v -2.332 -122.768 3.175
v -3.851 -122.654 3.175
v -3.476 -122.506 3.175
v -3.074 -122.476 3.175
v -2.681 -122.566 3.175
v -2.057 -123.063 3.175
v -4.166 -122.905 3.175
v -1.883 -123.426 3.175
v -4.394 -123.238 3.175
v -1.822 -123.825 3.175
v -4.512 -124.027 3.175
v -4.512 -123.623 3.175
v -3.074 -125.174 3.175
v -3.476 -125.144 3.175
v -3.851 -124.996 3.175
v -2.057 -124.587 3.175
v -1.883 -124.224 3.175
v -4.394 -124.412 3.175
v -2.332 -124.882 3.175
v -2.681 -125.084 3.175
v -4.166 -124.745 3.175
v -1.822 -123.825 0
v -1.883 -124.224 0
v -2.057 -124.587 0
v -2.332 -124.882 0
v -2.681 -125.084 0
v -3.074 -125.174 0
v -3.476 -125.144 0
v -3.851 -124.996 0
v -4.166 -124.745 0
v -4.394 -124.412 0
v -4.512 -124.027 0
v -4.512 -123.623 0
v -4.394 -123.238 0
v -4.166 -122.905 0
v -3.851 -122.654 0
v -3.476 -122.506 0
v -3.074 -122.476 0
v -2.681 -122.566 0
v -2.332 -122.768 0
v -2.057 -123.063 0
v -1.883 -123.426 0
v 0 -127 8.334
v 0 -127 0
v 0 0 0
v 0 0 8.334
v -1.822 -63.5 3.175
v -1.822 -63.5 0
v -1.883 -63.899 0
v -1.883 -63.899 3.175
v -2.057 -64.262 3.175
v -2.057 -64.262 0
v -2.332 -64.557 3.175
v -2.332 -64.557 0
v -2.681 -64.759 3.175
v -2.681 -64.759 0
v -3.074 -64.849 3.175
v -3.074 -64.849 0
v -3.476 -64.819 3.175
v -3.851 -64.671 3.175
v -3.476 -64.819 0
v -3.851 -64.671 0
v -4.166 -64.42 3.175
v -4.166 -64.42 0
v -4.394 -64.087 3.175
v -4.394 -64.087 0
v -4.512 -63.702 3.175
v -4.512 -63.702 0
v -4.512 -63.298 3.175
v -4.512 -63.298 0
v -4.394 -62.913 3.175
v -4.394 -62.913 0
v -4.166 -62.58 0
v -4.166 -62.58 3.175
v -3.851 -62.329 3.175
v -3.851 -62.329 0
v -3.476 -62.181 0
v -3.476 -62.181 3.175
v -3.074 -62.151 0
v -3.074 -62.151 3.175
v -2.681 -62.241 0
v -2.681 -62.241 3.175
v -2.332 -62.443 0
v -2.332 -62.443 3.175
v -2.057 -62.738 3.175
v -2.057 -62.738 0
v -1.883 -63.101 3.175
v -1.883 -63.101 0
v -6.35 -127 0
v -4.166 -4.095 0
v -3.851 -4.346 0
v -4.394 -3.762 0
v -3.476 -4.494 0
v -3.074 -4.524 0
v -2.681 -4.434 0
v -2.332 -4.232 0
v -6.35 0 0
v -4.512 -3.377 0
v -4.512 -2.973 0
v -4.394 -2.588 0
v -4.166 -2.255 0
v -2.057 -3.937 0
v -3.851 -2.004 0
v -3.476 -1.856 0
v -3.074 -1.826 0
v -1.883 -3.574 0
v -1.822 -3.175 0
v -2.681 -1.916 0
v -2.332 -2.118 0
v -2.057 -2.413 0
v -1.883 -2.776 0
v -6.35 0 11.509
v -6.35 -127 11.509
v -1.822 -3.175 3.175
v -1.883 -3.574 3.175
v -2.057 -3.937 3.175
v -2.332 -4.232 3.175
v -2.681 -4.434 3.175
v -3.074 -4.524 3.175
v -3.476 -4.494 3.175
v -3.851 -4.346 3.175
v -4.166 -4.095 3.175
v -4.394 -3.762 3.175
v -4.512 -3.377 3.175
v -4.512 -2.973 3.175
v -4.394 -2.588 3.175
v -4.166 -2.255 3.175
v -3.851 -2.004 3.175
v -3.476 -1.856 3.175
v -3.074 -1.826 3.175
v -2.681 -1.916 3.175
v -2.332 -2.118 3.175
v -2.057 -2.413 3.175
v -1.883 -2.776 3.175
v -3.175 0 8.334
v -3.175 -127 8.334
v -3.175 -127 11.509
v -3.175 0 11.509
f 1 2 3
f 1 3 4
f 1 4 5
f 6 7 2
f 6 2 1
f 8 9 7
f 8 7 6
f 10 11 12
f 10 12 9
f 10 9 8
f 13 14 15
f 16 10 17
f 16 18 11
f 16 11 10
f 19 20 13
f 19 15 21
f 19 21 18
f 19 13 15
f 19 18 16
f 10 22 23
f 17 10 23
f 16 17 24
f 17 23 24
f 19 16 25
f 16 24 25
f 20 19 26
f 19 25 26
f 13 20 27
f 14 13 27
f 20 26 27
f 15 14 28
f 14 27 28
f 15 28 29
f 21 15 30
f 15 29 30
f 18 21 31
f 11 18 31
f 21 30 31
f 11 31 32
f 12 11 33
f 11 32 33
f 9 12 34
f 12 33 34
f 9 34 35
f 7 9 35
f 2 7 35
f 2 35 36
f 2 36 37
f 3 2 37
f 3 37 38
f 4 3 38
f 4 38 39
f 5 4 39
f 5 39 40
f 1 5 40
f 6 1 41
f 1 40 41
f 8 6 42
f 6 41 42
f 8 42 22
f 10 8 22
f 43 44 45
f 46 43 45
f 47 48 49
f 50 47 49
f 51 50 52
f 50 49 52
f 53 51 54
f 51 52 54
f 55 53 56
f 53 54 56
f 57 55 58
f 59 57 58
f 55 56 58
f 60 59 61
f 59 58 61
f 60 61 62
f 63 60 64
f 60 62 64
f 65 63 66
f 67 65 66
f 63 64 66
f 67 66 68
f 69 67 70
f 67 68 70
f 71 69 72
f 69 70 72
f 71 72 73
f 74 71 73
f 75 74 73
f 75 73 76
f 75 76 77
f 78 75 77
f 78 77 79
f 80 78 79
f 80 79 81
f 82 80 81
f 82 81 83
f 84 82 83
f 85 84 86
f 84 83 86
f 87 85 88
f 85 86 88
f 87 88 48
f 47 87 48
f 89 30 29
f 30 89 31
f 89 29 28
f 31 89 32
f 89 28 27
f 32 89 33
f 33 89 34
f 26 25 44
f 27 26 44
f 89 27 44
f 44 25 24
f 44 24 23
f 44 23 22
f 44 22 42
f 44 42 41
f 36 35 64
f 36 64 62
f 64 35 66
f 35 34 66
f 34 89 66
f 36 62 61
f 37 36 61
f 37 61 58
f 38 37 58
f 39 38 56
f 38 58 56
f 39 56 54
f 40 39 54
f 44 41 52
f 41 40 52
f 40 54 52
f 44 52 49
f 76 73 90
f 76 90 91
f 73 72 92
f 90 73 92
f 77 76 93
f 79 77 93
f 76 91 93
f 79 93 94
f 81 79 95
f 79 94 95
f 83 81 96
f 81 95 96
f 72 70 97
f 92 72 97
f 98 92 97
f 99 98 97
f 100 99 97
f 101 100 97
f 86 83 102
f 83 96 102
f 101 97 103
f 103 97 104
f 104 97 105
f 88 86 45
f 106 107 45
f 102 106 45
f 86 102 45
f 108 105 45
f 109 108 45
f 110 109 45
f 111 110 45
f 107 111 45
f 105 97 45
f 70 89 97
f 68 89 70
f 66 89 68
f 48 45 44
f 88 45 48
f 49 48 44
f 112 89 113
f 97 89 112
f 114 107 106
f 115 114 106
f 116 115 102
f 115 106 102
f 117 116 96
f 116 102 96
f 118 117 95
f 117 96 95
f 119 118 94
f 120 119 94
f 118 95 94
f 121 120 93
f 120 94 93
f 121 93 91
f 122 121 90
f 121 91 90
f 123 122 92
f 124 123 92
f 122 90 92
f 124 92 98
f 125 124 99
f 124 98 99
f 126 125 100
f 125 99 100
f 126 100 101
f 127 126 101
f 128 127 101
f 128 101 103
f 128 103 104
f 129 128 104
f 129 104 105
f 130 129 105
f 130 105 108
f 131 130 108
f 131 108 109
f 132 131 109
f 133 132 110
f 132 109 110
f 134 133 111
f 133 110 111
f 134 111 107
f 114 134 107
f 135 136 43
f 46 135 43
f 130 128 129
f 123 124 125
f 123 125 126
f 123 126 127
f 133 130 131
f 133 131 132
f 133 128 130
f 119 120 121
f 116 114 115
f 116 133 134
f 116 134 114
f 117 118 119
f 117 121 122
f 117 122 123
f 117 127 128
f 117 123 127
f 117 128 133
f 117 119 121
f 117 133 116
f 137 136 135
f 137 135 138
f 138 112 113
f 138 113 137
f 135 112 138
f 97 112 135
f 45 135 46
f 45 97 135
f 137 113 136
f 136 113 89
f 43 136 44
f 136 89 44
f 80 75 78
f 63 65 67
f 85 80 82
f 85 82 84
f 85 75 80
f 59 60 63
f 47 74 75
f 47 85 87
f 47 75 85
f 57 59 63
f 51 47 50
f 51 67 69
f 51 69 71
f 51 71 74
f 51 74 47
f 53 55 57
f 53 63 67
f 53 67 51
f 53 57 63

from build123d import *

# Parameters (mm, degrees)
F0_W     = 6.35
F0_H     = 127
F1_DEPTH = 11.50874
F2_W     = 3.175
F2_H     = 3.175
F3_DEPTH = 127
F4_R     = 1.35255
F5_DEPTH = 3.175


with BuildPart() as f1:
    # F0 (on Top) → F1 (new body)
    with BuildSketch(Plane.XY):
        with Locations((-3.175, -63.5)):
            Rectangle(F0_W, F0_H)
    extrude(amount=F1_DEPTH)

    # F2 (on face) → F3 (cut, through all)
    with BuildSketch(Plane.XZ.offset(127)):
        with Locations((-1.5875, 9.92124)):
            Rectangle(F2_W, F2_H)
    extrude(amount=-F3_DEPTH, mode=Mode.SUBTRACT)

    # F4 (on face) → F5 (cut)
    with BuildSketch(Plane(origin=(0, 0, 0), x_dir=(1, 0, 0), z_dir=(0, 0, -1))):
        with Locations((-3.175, 123.825)):
            Circle(F4_R)
        with Locations((-3.175, 63.5)):
            Circle(F4_R)
        with Locations((-3.175, 3.175)):
            Circle(F4_R)
    extrude(amount=-F5_DEPTH, mode=Mode.SUBTRACT)


solid = f1.part
